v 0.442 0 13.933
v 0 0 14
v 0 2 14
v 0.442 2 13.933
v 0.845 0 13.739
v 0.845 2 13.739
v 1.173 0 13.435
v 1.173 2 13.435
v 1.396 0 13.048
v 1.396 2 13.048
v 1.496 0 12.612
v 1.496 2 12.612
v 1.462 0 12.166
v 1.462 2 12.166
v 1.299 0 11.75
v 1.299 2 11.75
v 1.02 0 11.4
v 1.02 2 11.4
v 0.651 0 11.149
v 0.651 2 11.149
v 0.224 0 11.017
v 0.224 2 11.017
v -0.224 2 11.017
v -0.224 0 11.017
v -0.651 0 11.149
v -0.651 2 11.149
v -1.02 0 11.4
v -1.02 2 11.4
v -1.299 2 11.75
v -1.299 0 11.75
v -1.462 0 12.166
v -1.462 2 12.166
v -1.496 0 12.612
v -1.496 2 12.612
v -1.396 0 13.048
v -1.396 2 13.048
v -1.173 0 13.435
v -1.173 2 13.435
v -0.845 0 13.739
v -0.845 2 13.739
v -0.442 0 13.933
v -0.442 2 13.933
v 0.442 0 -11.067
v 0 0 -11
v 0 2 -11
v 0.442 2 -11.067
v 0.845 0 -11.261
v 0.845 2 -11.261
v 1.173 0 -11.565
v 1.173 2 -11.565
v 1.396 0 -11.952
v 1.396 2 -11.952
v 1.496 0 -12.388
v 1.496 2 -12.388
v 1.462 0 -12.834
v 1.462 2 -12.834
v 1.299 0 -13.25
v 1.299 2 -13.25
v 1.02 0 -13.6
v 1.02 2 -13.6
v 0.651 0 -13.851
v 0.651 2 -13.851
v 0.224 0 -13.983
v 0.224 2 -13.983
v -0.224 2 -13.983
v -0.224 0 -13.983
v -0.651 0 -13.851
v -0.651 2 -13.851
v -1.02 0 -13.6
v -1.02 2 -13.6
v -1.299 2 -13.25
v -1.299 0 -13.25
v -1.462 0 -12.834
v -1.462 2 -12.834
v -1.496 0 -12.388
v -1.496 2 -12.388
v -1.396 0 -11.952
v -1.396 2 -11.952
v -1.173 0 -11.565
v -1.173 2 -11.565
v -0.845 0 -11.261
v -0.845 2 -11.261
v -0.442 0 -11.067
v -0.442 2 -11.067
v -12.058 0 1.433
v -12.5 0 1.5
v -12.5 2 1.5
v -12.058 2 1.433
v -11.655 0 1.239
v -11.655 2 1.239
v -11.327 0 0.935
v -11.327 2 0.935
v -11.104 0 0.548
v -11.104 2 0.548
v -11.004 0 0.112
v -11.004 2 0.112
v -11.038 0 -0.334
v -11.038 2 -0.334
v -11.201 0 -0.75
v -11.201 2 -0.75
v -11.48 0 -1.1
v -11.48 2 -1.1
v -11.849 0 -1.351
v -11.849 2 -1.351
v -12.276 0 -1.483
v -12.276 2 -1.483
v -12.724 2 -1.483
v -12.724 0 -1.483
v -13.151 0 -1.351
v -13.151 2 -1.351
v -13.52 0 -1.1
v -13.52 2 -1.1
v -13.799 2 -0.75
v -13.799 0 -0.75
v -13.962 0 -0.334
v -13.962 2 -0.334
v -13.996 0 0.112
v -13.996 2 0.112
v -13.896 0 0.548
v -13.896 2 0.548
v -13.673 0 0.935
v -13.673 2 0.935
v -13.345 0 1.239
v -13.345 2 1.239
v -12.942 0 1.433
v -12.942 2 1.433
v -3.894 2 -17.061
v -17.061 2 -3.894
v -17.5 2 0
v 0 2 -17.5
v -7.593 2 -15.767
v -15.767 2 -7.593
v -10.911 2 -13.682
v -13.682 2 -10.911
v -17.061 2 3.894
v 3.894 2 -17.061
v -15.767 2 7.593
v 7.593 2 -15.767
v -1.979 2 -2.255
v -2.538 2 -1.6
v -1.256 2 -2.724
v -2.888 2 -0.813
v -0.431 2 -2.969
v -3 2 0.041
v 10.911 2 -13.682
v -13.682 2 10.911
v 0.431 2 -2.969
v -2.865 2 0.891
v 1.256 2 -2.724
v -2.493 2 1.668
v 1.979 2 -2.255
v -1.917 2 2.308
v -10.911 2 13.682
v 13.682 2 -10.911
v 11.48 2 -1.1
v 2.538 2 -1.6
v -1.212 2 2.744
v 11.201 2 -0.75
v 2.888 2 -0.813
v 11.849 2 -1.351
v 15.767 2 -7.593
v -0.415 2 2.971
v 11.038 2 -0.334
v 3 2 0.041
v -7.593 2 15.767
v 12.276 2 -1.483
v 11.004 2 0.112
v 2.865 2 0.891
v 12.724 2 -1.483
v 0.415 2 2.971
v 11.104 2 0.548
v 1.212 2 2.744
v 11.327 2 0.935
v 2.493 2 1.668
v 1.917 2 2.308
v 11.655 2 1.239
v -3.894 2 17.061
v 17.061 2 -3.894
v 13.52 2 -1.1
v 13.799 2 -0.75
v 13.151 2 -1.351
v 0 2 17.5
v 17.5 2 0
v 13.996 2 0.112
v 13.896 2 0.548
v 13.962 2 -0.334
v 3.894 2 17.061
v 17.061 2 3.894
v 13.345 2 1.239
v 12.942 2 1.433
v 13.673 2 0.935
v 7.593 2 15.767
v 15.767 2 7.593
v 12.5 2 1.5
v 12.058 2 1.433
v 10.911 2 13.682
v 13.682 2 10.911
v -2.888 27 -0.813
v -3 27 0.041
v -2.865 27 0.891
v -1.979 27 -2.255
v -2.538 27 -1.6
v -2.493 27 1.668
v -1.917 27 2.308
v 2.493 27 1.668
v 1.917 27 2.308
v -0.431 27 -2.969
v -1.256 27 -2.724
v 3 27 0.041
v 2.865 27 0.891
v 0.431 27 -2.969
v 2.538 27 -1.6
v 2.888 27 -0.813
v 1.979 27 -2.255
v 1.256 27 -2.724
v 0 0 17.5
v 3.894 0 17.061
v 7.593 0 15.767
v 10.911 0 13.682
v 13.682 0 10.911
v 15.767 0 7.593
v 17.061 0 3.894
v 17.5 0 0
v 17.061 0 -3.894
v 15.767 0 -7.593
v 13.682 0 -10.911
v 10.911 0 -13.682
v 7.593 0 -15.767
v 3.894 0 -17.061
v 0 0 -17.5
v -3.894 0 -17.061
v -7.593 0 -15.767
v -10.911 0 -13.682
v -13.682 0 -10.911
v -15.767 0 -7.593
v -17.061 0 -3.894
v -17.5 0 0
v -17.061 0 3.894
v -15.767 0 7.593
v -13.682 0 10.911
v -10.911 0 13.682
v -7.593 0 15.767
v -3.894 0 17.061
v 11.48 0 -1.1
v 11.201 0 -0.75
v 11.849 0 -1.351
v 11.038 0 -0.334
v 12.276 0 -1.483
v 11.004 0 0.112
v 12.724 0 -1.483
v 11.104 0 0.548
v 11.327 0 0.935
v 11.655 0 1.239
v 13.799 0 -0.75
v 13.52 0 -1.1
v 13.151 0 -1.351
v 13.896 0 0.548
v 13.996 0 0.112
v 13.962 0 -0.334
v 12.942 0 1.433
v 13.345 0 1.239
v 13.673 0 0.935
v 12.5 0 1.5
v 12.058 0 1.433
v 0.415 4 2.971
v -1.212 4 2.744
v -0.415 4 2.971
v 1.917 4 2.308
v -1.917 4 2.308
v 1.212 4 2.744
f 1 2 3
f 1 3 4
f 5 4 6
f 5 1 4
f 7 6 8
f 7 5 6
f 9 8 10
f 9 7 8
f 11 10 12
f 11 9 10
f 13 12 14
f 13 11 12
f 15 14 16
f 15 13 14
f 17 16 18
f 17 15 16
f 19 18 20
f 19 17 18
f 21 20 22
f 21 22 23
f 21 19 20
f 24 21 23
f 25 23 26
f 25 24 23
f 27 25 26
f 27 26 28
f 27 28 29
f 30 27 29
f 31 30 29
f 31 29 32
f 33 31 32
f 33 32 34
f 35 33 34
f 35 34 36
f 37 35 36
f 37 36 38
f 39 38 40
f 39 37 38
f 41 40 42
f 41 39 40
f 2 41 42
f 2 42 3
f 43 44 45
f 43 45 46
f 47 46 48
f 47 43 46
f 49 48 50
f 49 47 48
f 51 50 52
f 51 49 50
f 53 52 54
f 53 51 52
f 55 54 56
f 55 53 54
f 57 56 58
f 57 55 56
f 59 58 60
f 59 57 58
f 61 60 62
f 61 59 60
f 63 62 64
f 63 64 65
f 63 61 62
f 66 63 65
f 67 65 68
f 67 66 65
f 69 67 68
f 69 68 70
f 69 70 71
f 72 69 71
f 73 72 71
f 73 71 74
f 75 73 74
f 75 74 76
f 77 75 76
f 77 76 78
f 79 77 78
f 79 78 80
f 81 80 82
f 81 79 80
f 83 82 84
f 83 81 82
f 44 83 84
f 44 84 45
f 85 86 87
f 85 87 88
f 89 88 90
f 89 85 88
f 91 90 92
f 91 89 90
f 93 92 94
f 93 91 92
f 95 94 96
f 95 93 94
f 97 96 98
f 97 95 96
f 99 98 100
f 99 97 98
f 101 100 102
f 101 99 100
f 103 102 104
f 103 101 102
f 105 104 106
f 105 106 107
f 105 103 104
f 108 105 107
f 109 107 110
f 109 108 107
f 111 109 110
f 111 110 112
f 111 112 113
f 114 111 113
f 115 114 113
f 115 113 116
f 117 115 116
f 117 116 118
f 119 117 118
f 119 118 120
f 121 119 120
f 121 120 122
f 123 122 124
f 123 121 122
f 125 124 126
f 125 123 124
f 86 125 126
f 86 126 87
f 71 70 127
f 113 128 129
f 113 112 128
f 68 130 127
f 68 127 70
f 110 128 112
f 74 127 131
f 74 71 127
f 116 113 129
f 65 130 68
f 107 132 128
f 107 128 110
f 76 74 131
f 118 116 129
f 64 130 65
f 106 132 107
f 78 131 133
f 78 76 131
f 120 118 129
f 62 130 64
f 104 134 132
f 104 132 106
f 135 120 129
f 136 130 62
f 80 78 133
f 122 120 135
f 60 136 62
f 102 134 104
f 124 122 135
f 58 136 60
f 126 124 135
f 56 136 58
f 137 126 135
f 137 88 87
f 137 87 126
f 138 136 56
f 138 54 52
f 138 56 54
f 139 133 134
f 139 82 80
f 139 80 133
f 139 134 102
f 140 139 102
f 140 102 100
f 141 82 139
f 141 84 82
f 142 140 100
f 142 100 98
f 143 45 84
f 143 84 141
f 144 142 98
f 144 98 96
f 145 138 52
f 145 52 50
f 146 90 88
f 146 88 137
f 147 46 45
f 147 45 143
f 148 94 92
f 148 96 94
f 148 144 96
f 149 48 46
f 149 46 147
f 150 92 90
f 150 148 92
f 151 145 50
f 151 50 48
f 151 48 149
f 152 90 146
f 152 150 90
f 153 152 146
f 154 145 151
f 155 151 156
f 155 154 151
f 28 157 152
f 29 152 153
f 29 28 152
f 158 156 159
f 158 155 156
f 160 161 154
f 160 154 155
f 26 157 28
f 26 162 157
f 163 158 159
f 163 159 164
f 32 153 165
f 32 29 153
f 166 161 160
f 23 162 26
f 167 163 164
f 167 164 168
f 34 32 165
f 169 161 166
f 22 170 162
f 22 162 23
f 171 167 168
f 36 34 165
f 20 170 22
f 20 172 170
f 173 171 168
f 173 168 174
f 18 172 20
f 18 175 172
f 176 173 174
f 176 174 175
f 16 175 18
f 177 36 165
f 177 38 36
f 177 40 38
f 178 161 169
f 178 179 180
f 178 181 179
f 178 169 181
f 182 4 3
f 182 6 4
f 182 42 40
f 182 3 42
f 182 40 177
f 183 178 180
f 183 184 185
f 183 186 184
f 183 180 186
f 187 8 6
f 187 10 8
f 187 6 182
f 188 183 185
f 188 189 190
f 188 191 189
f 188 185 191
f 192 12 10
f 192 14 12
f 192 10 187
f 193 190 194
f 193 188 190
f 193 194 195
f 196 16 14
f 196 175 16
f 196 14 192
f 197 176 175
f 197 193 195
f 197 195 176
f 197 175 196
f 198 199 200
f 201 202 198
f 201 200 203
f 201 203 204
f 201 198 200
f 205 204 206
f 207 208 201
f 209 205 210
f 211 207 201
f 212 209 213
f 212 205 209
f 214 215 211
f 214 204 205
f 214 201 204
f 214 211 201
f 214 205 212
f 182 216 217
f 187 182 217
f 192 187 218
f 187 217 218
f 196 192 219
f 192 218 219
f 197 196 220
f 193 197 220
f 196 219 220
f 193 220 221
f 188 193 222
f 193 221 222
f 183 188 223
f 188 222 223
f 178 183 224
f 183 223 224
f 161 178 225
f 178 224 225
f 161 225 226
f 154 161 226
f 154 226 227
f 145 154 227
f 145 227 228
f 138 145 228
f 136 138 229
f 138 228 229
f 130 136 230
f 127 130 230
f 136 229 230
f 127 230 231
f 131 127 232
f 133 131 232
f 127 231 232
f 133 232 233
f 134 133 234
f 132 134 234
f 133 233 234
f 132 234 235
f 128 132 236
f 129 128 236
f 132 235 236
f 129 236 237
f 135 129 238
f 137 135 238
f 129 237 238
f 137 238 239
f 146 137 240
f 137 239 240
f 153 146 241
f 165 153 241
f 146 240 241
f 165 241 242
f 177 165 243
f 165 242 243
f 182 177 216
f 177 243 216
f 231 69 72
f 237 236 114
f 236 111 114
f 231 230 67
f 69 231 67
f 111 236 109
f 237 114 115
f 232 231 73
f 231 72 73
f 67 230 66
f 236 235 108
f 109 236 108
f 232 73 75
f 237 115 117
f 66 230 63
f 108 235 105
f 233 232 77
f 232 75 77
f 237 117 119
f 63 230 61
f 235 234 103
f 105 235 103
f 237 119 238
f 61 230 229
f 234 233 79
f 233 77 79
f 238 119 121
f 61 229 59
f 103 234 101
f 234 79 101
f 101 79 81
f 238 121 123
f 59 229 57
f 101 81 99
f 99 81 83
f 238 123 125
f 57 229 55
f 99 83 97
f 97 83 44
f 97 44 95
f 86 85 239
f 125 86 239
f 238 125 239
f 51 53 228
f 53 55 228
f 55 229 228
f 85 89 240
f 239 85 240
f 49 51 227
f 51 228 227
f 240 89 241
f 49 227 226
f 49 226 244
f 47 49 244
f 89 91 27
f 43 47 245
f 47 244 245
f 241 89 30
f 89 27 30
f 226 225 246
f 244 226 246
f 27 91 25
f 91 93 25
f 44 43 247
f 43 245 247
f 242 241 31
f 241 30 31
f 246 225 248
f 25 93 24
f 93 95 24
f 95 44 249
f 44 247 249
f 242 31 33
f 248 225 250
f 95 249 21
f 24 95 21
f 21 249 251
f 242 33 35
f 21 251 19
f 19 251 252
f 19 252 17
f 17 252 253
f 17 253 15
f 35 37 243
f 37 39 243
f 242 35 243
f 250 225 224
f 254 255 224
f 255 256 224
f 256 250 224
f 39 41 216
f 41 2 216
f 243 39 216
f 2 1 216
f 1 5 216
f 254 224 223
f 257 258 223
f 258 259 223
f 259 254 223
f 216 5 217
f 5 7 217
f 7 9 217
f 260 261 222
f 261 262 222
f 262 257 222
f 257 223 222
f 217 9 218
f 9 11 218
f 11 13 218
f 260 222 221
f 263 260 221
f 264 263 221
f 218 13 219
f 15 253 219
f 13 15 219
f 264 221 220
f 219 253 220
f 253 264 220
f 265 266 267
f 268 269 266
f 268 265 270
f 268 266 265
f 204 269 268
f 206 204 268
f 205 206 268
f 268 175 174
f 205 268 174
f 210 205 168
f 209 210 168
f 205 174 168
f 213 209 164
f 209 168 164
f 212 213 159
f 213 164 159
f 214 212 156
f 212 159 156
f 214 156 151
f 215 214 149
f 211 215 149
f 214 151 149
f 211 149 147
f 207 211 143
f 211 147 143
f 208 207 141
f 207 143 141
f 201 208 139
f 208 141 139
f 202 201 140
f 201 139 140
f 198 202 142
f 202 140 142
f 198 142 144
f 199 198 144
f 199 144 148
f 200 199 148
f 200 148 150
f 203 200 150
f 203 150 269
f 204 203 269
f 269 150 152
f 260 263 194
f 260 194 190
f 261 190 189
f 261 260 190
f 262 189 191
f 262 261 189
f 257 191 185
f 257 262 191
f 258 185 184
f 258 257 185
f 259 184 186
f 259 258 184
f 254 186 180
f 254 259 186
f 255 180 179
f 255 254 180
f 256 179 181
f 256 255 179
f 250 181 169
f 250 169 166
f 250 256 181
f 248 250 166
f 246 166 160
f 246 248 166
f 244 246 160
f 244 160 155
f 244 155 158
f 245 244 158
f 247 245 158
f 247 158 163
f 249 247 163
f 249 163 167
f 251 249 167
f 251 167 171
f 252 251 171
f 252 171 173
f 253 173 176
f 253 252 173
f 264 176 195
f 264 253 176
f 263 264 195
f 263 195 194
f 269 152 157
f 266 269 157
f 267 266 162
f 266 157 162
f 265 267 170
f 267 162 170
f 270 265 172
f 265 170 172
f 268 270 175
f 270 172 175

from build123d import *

# Parameters (mm, degrees)
SKETCH_1_R      = 17.5
SKETCH_1_R_2    = 1.5
EXTRUDE_1_DEPTH = 2
EXTRUDE_2_DEPTH = 25
SKETCH_3_R      = 3
EXTRUDE_3_DEPTH = 2


with BuildPart() as part:
    # 草图1 → 凸台-拉伸1 (new body)
    with BuildSketch(Plane(origin=(0, 0, 0), x_dir=(1, 0, 0), z_dir=(0, 1, 0))):
        with Locations(Location((0, 0, 0), (0, 0, 270))):
            Circle(SKETCH_1_R)
        with Locations(Location((0, 12.5, 0), (0, 0, 270))):
            Circle(SKETCH_1_R_2, mode=Mode.SUBTRACT)
        with Locations(Location((12.5, 0, 0), (0, 0, 270))):
            Circle(SKETCH_1_R_2, mode=Mode.SUBTRACT)
        with Locations(Location((0, -12.5, 0), (0, 0, 270))):
            Circle(SKETCH_1_R_2, mode=Mode.SUBTRACT)
        with Locations(Location((-12.5, 0, 0), (0, 0, 270))):
            Circle(SKETCH_1_R_2, mode=Mode.SUBTRACT)
    extrude(amount=EXTRUDE_1_DEPTH)

    # 草图2 → 凸台-拉伸2 (add)
    with BuildSketch(Plane(origin=(0, 2, 0), x_dir=(1, 0, 0), z_dir=(0, 1, 0))):
        with BuildLine():
            Line((-1.916694525, -2.307873934), (1.916694525, -2.307873934))
            ThreePointArc((1.916694525, -2.307873934), (0, 3), (-1.916694525, -2.307873934))
        make_face()
    extrude(amount=EXTRUDE_2_DEPTH)

    # 草图3 → 凸台-拉伸3 (add)
    with BuildSketch(Plane(origin=(0, 2, 0), x_dir=(1, 0, 0), z_dir=(0, 1, 0))):
        with Locations(Location((0, 0, 0), (0, 0, 309.709708175))):
            Circle(SKETCH_3_R)
    extrude(amount=EXTRUDE_3_DEPTH)


solid = part.part
